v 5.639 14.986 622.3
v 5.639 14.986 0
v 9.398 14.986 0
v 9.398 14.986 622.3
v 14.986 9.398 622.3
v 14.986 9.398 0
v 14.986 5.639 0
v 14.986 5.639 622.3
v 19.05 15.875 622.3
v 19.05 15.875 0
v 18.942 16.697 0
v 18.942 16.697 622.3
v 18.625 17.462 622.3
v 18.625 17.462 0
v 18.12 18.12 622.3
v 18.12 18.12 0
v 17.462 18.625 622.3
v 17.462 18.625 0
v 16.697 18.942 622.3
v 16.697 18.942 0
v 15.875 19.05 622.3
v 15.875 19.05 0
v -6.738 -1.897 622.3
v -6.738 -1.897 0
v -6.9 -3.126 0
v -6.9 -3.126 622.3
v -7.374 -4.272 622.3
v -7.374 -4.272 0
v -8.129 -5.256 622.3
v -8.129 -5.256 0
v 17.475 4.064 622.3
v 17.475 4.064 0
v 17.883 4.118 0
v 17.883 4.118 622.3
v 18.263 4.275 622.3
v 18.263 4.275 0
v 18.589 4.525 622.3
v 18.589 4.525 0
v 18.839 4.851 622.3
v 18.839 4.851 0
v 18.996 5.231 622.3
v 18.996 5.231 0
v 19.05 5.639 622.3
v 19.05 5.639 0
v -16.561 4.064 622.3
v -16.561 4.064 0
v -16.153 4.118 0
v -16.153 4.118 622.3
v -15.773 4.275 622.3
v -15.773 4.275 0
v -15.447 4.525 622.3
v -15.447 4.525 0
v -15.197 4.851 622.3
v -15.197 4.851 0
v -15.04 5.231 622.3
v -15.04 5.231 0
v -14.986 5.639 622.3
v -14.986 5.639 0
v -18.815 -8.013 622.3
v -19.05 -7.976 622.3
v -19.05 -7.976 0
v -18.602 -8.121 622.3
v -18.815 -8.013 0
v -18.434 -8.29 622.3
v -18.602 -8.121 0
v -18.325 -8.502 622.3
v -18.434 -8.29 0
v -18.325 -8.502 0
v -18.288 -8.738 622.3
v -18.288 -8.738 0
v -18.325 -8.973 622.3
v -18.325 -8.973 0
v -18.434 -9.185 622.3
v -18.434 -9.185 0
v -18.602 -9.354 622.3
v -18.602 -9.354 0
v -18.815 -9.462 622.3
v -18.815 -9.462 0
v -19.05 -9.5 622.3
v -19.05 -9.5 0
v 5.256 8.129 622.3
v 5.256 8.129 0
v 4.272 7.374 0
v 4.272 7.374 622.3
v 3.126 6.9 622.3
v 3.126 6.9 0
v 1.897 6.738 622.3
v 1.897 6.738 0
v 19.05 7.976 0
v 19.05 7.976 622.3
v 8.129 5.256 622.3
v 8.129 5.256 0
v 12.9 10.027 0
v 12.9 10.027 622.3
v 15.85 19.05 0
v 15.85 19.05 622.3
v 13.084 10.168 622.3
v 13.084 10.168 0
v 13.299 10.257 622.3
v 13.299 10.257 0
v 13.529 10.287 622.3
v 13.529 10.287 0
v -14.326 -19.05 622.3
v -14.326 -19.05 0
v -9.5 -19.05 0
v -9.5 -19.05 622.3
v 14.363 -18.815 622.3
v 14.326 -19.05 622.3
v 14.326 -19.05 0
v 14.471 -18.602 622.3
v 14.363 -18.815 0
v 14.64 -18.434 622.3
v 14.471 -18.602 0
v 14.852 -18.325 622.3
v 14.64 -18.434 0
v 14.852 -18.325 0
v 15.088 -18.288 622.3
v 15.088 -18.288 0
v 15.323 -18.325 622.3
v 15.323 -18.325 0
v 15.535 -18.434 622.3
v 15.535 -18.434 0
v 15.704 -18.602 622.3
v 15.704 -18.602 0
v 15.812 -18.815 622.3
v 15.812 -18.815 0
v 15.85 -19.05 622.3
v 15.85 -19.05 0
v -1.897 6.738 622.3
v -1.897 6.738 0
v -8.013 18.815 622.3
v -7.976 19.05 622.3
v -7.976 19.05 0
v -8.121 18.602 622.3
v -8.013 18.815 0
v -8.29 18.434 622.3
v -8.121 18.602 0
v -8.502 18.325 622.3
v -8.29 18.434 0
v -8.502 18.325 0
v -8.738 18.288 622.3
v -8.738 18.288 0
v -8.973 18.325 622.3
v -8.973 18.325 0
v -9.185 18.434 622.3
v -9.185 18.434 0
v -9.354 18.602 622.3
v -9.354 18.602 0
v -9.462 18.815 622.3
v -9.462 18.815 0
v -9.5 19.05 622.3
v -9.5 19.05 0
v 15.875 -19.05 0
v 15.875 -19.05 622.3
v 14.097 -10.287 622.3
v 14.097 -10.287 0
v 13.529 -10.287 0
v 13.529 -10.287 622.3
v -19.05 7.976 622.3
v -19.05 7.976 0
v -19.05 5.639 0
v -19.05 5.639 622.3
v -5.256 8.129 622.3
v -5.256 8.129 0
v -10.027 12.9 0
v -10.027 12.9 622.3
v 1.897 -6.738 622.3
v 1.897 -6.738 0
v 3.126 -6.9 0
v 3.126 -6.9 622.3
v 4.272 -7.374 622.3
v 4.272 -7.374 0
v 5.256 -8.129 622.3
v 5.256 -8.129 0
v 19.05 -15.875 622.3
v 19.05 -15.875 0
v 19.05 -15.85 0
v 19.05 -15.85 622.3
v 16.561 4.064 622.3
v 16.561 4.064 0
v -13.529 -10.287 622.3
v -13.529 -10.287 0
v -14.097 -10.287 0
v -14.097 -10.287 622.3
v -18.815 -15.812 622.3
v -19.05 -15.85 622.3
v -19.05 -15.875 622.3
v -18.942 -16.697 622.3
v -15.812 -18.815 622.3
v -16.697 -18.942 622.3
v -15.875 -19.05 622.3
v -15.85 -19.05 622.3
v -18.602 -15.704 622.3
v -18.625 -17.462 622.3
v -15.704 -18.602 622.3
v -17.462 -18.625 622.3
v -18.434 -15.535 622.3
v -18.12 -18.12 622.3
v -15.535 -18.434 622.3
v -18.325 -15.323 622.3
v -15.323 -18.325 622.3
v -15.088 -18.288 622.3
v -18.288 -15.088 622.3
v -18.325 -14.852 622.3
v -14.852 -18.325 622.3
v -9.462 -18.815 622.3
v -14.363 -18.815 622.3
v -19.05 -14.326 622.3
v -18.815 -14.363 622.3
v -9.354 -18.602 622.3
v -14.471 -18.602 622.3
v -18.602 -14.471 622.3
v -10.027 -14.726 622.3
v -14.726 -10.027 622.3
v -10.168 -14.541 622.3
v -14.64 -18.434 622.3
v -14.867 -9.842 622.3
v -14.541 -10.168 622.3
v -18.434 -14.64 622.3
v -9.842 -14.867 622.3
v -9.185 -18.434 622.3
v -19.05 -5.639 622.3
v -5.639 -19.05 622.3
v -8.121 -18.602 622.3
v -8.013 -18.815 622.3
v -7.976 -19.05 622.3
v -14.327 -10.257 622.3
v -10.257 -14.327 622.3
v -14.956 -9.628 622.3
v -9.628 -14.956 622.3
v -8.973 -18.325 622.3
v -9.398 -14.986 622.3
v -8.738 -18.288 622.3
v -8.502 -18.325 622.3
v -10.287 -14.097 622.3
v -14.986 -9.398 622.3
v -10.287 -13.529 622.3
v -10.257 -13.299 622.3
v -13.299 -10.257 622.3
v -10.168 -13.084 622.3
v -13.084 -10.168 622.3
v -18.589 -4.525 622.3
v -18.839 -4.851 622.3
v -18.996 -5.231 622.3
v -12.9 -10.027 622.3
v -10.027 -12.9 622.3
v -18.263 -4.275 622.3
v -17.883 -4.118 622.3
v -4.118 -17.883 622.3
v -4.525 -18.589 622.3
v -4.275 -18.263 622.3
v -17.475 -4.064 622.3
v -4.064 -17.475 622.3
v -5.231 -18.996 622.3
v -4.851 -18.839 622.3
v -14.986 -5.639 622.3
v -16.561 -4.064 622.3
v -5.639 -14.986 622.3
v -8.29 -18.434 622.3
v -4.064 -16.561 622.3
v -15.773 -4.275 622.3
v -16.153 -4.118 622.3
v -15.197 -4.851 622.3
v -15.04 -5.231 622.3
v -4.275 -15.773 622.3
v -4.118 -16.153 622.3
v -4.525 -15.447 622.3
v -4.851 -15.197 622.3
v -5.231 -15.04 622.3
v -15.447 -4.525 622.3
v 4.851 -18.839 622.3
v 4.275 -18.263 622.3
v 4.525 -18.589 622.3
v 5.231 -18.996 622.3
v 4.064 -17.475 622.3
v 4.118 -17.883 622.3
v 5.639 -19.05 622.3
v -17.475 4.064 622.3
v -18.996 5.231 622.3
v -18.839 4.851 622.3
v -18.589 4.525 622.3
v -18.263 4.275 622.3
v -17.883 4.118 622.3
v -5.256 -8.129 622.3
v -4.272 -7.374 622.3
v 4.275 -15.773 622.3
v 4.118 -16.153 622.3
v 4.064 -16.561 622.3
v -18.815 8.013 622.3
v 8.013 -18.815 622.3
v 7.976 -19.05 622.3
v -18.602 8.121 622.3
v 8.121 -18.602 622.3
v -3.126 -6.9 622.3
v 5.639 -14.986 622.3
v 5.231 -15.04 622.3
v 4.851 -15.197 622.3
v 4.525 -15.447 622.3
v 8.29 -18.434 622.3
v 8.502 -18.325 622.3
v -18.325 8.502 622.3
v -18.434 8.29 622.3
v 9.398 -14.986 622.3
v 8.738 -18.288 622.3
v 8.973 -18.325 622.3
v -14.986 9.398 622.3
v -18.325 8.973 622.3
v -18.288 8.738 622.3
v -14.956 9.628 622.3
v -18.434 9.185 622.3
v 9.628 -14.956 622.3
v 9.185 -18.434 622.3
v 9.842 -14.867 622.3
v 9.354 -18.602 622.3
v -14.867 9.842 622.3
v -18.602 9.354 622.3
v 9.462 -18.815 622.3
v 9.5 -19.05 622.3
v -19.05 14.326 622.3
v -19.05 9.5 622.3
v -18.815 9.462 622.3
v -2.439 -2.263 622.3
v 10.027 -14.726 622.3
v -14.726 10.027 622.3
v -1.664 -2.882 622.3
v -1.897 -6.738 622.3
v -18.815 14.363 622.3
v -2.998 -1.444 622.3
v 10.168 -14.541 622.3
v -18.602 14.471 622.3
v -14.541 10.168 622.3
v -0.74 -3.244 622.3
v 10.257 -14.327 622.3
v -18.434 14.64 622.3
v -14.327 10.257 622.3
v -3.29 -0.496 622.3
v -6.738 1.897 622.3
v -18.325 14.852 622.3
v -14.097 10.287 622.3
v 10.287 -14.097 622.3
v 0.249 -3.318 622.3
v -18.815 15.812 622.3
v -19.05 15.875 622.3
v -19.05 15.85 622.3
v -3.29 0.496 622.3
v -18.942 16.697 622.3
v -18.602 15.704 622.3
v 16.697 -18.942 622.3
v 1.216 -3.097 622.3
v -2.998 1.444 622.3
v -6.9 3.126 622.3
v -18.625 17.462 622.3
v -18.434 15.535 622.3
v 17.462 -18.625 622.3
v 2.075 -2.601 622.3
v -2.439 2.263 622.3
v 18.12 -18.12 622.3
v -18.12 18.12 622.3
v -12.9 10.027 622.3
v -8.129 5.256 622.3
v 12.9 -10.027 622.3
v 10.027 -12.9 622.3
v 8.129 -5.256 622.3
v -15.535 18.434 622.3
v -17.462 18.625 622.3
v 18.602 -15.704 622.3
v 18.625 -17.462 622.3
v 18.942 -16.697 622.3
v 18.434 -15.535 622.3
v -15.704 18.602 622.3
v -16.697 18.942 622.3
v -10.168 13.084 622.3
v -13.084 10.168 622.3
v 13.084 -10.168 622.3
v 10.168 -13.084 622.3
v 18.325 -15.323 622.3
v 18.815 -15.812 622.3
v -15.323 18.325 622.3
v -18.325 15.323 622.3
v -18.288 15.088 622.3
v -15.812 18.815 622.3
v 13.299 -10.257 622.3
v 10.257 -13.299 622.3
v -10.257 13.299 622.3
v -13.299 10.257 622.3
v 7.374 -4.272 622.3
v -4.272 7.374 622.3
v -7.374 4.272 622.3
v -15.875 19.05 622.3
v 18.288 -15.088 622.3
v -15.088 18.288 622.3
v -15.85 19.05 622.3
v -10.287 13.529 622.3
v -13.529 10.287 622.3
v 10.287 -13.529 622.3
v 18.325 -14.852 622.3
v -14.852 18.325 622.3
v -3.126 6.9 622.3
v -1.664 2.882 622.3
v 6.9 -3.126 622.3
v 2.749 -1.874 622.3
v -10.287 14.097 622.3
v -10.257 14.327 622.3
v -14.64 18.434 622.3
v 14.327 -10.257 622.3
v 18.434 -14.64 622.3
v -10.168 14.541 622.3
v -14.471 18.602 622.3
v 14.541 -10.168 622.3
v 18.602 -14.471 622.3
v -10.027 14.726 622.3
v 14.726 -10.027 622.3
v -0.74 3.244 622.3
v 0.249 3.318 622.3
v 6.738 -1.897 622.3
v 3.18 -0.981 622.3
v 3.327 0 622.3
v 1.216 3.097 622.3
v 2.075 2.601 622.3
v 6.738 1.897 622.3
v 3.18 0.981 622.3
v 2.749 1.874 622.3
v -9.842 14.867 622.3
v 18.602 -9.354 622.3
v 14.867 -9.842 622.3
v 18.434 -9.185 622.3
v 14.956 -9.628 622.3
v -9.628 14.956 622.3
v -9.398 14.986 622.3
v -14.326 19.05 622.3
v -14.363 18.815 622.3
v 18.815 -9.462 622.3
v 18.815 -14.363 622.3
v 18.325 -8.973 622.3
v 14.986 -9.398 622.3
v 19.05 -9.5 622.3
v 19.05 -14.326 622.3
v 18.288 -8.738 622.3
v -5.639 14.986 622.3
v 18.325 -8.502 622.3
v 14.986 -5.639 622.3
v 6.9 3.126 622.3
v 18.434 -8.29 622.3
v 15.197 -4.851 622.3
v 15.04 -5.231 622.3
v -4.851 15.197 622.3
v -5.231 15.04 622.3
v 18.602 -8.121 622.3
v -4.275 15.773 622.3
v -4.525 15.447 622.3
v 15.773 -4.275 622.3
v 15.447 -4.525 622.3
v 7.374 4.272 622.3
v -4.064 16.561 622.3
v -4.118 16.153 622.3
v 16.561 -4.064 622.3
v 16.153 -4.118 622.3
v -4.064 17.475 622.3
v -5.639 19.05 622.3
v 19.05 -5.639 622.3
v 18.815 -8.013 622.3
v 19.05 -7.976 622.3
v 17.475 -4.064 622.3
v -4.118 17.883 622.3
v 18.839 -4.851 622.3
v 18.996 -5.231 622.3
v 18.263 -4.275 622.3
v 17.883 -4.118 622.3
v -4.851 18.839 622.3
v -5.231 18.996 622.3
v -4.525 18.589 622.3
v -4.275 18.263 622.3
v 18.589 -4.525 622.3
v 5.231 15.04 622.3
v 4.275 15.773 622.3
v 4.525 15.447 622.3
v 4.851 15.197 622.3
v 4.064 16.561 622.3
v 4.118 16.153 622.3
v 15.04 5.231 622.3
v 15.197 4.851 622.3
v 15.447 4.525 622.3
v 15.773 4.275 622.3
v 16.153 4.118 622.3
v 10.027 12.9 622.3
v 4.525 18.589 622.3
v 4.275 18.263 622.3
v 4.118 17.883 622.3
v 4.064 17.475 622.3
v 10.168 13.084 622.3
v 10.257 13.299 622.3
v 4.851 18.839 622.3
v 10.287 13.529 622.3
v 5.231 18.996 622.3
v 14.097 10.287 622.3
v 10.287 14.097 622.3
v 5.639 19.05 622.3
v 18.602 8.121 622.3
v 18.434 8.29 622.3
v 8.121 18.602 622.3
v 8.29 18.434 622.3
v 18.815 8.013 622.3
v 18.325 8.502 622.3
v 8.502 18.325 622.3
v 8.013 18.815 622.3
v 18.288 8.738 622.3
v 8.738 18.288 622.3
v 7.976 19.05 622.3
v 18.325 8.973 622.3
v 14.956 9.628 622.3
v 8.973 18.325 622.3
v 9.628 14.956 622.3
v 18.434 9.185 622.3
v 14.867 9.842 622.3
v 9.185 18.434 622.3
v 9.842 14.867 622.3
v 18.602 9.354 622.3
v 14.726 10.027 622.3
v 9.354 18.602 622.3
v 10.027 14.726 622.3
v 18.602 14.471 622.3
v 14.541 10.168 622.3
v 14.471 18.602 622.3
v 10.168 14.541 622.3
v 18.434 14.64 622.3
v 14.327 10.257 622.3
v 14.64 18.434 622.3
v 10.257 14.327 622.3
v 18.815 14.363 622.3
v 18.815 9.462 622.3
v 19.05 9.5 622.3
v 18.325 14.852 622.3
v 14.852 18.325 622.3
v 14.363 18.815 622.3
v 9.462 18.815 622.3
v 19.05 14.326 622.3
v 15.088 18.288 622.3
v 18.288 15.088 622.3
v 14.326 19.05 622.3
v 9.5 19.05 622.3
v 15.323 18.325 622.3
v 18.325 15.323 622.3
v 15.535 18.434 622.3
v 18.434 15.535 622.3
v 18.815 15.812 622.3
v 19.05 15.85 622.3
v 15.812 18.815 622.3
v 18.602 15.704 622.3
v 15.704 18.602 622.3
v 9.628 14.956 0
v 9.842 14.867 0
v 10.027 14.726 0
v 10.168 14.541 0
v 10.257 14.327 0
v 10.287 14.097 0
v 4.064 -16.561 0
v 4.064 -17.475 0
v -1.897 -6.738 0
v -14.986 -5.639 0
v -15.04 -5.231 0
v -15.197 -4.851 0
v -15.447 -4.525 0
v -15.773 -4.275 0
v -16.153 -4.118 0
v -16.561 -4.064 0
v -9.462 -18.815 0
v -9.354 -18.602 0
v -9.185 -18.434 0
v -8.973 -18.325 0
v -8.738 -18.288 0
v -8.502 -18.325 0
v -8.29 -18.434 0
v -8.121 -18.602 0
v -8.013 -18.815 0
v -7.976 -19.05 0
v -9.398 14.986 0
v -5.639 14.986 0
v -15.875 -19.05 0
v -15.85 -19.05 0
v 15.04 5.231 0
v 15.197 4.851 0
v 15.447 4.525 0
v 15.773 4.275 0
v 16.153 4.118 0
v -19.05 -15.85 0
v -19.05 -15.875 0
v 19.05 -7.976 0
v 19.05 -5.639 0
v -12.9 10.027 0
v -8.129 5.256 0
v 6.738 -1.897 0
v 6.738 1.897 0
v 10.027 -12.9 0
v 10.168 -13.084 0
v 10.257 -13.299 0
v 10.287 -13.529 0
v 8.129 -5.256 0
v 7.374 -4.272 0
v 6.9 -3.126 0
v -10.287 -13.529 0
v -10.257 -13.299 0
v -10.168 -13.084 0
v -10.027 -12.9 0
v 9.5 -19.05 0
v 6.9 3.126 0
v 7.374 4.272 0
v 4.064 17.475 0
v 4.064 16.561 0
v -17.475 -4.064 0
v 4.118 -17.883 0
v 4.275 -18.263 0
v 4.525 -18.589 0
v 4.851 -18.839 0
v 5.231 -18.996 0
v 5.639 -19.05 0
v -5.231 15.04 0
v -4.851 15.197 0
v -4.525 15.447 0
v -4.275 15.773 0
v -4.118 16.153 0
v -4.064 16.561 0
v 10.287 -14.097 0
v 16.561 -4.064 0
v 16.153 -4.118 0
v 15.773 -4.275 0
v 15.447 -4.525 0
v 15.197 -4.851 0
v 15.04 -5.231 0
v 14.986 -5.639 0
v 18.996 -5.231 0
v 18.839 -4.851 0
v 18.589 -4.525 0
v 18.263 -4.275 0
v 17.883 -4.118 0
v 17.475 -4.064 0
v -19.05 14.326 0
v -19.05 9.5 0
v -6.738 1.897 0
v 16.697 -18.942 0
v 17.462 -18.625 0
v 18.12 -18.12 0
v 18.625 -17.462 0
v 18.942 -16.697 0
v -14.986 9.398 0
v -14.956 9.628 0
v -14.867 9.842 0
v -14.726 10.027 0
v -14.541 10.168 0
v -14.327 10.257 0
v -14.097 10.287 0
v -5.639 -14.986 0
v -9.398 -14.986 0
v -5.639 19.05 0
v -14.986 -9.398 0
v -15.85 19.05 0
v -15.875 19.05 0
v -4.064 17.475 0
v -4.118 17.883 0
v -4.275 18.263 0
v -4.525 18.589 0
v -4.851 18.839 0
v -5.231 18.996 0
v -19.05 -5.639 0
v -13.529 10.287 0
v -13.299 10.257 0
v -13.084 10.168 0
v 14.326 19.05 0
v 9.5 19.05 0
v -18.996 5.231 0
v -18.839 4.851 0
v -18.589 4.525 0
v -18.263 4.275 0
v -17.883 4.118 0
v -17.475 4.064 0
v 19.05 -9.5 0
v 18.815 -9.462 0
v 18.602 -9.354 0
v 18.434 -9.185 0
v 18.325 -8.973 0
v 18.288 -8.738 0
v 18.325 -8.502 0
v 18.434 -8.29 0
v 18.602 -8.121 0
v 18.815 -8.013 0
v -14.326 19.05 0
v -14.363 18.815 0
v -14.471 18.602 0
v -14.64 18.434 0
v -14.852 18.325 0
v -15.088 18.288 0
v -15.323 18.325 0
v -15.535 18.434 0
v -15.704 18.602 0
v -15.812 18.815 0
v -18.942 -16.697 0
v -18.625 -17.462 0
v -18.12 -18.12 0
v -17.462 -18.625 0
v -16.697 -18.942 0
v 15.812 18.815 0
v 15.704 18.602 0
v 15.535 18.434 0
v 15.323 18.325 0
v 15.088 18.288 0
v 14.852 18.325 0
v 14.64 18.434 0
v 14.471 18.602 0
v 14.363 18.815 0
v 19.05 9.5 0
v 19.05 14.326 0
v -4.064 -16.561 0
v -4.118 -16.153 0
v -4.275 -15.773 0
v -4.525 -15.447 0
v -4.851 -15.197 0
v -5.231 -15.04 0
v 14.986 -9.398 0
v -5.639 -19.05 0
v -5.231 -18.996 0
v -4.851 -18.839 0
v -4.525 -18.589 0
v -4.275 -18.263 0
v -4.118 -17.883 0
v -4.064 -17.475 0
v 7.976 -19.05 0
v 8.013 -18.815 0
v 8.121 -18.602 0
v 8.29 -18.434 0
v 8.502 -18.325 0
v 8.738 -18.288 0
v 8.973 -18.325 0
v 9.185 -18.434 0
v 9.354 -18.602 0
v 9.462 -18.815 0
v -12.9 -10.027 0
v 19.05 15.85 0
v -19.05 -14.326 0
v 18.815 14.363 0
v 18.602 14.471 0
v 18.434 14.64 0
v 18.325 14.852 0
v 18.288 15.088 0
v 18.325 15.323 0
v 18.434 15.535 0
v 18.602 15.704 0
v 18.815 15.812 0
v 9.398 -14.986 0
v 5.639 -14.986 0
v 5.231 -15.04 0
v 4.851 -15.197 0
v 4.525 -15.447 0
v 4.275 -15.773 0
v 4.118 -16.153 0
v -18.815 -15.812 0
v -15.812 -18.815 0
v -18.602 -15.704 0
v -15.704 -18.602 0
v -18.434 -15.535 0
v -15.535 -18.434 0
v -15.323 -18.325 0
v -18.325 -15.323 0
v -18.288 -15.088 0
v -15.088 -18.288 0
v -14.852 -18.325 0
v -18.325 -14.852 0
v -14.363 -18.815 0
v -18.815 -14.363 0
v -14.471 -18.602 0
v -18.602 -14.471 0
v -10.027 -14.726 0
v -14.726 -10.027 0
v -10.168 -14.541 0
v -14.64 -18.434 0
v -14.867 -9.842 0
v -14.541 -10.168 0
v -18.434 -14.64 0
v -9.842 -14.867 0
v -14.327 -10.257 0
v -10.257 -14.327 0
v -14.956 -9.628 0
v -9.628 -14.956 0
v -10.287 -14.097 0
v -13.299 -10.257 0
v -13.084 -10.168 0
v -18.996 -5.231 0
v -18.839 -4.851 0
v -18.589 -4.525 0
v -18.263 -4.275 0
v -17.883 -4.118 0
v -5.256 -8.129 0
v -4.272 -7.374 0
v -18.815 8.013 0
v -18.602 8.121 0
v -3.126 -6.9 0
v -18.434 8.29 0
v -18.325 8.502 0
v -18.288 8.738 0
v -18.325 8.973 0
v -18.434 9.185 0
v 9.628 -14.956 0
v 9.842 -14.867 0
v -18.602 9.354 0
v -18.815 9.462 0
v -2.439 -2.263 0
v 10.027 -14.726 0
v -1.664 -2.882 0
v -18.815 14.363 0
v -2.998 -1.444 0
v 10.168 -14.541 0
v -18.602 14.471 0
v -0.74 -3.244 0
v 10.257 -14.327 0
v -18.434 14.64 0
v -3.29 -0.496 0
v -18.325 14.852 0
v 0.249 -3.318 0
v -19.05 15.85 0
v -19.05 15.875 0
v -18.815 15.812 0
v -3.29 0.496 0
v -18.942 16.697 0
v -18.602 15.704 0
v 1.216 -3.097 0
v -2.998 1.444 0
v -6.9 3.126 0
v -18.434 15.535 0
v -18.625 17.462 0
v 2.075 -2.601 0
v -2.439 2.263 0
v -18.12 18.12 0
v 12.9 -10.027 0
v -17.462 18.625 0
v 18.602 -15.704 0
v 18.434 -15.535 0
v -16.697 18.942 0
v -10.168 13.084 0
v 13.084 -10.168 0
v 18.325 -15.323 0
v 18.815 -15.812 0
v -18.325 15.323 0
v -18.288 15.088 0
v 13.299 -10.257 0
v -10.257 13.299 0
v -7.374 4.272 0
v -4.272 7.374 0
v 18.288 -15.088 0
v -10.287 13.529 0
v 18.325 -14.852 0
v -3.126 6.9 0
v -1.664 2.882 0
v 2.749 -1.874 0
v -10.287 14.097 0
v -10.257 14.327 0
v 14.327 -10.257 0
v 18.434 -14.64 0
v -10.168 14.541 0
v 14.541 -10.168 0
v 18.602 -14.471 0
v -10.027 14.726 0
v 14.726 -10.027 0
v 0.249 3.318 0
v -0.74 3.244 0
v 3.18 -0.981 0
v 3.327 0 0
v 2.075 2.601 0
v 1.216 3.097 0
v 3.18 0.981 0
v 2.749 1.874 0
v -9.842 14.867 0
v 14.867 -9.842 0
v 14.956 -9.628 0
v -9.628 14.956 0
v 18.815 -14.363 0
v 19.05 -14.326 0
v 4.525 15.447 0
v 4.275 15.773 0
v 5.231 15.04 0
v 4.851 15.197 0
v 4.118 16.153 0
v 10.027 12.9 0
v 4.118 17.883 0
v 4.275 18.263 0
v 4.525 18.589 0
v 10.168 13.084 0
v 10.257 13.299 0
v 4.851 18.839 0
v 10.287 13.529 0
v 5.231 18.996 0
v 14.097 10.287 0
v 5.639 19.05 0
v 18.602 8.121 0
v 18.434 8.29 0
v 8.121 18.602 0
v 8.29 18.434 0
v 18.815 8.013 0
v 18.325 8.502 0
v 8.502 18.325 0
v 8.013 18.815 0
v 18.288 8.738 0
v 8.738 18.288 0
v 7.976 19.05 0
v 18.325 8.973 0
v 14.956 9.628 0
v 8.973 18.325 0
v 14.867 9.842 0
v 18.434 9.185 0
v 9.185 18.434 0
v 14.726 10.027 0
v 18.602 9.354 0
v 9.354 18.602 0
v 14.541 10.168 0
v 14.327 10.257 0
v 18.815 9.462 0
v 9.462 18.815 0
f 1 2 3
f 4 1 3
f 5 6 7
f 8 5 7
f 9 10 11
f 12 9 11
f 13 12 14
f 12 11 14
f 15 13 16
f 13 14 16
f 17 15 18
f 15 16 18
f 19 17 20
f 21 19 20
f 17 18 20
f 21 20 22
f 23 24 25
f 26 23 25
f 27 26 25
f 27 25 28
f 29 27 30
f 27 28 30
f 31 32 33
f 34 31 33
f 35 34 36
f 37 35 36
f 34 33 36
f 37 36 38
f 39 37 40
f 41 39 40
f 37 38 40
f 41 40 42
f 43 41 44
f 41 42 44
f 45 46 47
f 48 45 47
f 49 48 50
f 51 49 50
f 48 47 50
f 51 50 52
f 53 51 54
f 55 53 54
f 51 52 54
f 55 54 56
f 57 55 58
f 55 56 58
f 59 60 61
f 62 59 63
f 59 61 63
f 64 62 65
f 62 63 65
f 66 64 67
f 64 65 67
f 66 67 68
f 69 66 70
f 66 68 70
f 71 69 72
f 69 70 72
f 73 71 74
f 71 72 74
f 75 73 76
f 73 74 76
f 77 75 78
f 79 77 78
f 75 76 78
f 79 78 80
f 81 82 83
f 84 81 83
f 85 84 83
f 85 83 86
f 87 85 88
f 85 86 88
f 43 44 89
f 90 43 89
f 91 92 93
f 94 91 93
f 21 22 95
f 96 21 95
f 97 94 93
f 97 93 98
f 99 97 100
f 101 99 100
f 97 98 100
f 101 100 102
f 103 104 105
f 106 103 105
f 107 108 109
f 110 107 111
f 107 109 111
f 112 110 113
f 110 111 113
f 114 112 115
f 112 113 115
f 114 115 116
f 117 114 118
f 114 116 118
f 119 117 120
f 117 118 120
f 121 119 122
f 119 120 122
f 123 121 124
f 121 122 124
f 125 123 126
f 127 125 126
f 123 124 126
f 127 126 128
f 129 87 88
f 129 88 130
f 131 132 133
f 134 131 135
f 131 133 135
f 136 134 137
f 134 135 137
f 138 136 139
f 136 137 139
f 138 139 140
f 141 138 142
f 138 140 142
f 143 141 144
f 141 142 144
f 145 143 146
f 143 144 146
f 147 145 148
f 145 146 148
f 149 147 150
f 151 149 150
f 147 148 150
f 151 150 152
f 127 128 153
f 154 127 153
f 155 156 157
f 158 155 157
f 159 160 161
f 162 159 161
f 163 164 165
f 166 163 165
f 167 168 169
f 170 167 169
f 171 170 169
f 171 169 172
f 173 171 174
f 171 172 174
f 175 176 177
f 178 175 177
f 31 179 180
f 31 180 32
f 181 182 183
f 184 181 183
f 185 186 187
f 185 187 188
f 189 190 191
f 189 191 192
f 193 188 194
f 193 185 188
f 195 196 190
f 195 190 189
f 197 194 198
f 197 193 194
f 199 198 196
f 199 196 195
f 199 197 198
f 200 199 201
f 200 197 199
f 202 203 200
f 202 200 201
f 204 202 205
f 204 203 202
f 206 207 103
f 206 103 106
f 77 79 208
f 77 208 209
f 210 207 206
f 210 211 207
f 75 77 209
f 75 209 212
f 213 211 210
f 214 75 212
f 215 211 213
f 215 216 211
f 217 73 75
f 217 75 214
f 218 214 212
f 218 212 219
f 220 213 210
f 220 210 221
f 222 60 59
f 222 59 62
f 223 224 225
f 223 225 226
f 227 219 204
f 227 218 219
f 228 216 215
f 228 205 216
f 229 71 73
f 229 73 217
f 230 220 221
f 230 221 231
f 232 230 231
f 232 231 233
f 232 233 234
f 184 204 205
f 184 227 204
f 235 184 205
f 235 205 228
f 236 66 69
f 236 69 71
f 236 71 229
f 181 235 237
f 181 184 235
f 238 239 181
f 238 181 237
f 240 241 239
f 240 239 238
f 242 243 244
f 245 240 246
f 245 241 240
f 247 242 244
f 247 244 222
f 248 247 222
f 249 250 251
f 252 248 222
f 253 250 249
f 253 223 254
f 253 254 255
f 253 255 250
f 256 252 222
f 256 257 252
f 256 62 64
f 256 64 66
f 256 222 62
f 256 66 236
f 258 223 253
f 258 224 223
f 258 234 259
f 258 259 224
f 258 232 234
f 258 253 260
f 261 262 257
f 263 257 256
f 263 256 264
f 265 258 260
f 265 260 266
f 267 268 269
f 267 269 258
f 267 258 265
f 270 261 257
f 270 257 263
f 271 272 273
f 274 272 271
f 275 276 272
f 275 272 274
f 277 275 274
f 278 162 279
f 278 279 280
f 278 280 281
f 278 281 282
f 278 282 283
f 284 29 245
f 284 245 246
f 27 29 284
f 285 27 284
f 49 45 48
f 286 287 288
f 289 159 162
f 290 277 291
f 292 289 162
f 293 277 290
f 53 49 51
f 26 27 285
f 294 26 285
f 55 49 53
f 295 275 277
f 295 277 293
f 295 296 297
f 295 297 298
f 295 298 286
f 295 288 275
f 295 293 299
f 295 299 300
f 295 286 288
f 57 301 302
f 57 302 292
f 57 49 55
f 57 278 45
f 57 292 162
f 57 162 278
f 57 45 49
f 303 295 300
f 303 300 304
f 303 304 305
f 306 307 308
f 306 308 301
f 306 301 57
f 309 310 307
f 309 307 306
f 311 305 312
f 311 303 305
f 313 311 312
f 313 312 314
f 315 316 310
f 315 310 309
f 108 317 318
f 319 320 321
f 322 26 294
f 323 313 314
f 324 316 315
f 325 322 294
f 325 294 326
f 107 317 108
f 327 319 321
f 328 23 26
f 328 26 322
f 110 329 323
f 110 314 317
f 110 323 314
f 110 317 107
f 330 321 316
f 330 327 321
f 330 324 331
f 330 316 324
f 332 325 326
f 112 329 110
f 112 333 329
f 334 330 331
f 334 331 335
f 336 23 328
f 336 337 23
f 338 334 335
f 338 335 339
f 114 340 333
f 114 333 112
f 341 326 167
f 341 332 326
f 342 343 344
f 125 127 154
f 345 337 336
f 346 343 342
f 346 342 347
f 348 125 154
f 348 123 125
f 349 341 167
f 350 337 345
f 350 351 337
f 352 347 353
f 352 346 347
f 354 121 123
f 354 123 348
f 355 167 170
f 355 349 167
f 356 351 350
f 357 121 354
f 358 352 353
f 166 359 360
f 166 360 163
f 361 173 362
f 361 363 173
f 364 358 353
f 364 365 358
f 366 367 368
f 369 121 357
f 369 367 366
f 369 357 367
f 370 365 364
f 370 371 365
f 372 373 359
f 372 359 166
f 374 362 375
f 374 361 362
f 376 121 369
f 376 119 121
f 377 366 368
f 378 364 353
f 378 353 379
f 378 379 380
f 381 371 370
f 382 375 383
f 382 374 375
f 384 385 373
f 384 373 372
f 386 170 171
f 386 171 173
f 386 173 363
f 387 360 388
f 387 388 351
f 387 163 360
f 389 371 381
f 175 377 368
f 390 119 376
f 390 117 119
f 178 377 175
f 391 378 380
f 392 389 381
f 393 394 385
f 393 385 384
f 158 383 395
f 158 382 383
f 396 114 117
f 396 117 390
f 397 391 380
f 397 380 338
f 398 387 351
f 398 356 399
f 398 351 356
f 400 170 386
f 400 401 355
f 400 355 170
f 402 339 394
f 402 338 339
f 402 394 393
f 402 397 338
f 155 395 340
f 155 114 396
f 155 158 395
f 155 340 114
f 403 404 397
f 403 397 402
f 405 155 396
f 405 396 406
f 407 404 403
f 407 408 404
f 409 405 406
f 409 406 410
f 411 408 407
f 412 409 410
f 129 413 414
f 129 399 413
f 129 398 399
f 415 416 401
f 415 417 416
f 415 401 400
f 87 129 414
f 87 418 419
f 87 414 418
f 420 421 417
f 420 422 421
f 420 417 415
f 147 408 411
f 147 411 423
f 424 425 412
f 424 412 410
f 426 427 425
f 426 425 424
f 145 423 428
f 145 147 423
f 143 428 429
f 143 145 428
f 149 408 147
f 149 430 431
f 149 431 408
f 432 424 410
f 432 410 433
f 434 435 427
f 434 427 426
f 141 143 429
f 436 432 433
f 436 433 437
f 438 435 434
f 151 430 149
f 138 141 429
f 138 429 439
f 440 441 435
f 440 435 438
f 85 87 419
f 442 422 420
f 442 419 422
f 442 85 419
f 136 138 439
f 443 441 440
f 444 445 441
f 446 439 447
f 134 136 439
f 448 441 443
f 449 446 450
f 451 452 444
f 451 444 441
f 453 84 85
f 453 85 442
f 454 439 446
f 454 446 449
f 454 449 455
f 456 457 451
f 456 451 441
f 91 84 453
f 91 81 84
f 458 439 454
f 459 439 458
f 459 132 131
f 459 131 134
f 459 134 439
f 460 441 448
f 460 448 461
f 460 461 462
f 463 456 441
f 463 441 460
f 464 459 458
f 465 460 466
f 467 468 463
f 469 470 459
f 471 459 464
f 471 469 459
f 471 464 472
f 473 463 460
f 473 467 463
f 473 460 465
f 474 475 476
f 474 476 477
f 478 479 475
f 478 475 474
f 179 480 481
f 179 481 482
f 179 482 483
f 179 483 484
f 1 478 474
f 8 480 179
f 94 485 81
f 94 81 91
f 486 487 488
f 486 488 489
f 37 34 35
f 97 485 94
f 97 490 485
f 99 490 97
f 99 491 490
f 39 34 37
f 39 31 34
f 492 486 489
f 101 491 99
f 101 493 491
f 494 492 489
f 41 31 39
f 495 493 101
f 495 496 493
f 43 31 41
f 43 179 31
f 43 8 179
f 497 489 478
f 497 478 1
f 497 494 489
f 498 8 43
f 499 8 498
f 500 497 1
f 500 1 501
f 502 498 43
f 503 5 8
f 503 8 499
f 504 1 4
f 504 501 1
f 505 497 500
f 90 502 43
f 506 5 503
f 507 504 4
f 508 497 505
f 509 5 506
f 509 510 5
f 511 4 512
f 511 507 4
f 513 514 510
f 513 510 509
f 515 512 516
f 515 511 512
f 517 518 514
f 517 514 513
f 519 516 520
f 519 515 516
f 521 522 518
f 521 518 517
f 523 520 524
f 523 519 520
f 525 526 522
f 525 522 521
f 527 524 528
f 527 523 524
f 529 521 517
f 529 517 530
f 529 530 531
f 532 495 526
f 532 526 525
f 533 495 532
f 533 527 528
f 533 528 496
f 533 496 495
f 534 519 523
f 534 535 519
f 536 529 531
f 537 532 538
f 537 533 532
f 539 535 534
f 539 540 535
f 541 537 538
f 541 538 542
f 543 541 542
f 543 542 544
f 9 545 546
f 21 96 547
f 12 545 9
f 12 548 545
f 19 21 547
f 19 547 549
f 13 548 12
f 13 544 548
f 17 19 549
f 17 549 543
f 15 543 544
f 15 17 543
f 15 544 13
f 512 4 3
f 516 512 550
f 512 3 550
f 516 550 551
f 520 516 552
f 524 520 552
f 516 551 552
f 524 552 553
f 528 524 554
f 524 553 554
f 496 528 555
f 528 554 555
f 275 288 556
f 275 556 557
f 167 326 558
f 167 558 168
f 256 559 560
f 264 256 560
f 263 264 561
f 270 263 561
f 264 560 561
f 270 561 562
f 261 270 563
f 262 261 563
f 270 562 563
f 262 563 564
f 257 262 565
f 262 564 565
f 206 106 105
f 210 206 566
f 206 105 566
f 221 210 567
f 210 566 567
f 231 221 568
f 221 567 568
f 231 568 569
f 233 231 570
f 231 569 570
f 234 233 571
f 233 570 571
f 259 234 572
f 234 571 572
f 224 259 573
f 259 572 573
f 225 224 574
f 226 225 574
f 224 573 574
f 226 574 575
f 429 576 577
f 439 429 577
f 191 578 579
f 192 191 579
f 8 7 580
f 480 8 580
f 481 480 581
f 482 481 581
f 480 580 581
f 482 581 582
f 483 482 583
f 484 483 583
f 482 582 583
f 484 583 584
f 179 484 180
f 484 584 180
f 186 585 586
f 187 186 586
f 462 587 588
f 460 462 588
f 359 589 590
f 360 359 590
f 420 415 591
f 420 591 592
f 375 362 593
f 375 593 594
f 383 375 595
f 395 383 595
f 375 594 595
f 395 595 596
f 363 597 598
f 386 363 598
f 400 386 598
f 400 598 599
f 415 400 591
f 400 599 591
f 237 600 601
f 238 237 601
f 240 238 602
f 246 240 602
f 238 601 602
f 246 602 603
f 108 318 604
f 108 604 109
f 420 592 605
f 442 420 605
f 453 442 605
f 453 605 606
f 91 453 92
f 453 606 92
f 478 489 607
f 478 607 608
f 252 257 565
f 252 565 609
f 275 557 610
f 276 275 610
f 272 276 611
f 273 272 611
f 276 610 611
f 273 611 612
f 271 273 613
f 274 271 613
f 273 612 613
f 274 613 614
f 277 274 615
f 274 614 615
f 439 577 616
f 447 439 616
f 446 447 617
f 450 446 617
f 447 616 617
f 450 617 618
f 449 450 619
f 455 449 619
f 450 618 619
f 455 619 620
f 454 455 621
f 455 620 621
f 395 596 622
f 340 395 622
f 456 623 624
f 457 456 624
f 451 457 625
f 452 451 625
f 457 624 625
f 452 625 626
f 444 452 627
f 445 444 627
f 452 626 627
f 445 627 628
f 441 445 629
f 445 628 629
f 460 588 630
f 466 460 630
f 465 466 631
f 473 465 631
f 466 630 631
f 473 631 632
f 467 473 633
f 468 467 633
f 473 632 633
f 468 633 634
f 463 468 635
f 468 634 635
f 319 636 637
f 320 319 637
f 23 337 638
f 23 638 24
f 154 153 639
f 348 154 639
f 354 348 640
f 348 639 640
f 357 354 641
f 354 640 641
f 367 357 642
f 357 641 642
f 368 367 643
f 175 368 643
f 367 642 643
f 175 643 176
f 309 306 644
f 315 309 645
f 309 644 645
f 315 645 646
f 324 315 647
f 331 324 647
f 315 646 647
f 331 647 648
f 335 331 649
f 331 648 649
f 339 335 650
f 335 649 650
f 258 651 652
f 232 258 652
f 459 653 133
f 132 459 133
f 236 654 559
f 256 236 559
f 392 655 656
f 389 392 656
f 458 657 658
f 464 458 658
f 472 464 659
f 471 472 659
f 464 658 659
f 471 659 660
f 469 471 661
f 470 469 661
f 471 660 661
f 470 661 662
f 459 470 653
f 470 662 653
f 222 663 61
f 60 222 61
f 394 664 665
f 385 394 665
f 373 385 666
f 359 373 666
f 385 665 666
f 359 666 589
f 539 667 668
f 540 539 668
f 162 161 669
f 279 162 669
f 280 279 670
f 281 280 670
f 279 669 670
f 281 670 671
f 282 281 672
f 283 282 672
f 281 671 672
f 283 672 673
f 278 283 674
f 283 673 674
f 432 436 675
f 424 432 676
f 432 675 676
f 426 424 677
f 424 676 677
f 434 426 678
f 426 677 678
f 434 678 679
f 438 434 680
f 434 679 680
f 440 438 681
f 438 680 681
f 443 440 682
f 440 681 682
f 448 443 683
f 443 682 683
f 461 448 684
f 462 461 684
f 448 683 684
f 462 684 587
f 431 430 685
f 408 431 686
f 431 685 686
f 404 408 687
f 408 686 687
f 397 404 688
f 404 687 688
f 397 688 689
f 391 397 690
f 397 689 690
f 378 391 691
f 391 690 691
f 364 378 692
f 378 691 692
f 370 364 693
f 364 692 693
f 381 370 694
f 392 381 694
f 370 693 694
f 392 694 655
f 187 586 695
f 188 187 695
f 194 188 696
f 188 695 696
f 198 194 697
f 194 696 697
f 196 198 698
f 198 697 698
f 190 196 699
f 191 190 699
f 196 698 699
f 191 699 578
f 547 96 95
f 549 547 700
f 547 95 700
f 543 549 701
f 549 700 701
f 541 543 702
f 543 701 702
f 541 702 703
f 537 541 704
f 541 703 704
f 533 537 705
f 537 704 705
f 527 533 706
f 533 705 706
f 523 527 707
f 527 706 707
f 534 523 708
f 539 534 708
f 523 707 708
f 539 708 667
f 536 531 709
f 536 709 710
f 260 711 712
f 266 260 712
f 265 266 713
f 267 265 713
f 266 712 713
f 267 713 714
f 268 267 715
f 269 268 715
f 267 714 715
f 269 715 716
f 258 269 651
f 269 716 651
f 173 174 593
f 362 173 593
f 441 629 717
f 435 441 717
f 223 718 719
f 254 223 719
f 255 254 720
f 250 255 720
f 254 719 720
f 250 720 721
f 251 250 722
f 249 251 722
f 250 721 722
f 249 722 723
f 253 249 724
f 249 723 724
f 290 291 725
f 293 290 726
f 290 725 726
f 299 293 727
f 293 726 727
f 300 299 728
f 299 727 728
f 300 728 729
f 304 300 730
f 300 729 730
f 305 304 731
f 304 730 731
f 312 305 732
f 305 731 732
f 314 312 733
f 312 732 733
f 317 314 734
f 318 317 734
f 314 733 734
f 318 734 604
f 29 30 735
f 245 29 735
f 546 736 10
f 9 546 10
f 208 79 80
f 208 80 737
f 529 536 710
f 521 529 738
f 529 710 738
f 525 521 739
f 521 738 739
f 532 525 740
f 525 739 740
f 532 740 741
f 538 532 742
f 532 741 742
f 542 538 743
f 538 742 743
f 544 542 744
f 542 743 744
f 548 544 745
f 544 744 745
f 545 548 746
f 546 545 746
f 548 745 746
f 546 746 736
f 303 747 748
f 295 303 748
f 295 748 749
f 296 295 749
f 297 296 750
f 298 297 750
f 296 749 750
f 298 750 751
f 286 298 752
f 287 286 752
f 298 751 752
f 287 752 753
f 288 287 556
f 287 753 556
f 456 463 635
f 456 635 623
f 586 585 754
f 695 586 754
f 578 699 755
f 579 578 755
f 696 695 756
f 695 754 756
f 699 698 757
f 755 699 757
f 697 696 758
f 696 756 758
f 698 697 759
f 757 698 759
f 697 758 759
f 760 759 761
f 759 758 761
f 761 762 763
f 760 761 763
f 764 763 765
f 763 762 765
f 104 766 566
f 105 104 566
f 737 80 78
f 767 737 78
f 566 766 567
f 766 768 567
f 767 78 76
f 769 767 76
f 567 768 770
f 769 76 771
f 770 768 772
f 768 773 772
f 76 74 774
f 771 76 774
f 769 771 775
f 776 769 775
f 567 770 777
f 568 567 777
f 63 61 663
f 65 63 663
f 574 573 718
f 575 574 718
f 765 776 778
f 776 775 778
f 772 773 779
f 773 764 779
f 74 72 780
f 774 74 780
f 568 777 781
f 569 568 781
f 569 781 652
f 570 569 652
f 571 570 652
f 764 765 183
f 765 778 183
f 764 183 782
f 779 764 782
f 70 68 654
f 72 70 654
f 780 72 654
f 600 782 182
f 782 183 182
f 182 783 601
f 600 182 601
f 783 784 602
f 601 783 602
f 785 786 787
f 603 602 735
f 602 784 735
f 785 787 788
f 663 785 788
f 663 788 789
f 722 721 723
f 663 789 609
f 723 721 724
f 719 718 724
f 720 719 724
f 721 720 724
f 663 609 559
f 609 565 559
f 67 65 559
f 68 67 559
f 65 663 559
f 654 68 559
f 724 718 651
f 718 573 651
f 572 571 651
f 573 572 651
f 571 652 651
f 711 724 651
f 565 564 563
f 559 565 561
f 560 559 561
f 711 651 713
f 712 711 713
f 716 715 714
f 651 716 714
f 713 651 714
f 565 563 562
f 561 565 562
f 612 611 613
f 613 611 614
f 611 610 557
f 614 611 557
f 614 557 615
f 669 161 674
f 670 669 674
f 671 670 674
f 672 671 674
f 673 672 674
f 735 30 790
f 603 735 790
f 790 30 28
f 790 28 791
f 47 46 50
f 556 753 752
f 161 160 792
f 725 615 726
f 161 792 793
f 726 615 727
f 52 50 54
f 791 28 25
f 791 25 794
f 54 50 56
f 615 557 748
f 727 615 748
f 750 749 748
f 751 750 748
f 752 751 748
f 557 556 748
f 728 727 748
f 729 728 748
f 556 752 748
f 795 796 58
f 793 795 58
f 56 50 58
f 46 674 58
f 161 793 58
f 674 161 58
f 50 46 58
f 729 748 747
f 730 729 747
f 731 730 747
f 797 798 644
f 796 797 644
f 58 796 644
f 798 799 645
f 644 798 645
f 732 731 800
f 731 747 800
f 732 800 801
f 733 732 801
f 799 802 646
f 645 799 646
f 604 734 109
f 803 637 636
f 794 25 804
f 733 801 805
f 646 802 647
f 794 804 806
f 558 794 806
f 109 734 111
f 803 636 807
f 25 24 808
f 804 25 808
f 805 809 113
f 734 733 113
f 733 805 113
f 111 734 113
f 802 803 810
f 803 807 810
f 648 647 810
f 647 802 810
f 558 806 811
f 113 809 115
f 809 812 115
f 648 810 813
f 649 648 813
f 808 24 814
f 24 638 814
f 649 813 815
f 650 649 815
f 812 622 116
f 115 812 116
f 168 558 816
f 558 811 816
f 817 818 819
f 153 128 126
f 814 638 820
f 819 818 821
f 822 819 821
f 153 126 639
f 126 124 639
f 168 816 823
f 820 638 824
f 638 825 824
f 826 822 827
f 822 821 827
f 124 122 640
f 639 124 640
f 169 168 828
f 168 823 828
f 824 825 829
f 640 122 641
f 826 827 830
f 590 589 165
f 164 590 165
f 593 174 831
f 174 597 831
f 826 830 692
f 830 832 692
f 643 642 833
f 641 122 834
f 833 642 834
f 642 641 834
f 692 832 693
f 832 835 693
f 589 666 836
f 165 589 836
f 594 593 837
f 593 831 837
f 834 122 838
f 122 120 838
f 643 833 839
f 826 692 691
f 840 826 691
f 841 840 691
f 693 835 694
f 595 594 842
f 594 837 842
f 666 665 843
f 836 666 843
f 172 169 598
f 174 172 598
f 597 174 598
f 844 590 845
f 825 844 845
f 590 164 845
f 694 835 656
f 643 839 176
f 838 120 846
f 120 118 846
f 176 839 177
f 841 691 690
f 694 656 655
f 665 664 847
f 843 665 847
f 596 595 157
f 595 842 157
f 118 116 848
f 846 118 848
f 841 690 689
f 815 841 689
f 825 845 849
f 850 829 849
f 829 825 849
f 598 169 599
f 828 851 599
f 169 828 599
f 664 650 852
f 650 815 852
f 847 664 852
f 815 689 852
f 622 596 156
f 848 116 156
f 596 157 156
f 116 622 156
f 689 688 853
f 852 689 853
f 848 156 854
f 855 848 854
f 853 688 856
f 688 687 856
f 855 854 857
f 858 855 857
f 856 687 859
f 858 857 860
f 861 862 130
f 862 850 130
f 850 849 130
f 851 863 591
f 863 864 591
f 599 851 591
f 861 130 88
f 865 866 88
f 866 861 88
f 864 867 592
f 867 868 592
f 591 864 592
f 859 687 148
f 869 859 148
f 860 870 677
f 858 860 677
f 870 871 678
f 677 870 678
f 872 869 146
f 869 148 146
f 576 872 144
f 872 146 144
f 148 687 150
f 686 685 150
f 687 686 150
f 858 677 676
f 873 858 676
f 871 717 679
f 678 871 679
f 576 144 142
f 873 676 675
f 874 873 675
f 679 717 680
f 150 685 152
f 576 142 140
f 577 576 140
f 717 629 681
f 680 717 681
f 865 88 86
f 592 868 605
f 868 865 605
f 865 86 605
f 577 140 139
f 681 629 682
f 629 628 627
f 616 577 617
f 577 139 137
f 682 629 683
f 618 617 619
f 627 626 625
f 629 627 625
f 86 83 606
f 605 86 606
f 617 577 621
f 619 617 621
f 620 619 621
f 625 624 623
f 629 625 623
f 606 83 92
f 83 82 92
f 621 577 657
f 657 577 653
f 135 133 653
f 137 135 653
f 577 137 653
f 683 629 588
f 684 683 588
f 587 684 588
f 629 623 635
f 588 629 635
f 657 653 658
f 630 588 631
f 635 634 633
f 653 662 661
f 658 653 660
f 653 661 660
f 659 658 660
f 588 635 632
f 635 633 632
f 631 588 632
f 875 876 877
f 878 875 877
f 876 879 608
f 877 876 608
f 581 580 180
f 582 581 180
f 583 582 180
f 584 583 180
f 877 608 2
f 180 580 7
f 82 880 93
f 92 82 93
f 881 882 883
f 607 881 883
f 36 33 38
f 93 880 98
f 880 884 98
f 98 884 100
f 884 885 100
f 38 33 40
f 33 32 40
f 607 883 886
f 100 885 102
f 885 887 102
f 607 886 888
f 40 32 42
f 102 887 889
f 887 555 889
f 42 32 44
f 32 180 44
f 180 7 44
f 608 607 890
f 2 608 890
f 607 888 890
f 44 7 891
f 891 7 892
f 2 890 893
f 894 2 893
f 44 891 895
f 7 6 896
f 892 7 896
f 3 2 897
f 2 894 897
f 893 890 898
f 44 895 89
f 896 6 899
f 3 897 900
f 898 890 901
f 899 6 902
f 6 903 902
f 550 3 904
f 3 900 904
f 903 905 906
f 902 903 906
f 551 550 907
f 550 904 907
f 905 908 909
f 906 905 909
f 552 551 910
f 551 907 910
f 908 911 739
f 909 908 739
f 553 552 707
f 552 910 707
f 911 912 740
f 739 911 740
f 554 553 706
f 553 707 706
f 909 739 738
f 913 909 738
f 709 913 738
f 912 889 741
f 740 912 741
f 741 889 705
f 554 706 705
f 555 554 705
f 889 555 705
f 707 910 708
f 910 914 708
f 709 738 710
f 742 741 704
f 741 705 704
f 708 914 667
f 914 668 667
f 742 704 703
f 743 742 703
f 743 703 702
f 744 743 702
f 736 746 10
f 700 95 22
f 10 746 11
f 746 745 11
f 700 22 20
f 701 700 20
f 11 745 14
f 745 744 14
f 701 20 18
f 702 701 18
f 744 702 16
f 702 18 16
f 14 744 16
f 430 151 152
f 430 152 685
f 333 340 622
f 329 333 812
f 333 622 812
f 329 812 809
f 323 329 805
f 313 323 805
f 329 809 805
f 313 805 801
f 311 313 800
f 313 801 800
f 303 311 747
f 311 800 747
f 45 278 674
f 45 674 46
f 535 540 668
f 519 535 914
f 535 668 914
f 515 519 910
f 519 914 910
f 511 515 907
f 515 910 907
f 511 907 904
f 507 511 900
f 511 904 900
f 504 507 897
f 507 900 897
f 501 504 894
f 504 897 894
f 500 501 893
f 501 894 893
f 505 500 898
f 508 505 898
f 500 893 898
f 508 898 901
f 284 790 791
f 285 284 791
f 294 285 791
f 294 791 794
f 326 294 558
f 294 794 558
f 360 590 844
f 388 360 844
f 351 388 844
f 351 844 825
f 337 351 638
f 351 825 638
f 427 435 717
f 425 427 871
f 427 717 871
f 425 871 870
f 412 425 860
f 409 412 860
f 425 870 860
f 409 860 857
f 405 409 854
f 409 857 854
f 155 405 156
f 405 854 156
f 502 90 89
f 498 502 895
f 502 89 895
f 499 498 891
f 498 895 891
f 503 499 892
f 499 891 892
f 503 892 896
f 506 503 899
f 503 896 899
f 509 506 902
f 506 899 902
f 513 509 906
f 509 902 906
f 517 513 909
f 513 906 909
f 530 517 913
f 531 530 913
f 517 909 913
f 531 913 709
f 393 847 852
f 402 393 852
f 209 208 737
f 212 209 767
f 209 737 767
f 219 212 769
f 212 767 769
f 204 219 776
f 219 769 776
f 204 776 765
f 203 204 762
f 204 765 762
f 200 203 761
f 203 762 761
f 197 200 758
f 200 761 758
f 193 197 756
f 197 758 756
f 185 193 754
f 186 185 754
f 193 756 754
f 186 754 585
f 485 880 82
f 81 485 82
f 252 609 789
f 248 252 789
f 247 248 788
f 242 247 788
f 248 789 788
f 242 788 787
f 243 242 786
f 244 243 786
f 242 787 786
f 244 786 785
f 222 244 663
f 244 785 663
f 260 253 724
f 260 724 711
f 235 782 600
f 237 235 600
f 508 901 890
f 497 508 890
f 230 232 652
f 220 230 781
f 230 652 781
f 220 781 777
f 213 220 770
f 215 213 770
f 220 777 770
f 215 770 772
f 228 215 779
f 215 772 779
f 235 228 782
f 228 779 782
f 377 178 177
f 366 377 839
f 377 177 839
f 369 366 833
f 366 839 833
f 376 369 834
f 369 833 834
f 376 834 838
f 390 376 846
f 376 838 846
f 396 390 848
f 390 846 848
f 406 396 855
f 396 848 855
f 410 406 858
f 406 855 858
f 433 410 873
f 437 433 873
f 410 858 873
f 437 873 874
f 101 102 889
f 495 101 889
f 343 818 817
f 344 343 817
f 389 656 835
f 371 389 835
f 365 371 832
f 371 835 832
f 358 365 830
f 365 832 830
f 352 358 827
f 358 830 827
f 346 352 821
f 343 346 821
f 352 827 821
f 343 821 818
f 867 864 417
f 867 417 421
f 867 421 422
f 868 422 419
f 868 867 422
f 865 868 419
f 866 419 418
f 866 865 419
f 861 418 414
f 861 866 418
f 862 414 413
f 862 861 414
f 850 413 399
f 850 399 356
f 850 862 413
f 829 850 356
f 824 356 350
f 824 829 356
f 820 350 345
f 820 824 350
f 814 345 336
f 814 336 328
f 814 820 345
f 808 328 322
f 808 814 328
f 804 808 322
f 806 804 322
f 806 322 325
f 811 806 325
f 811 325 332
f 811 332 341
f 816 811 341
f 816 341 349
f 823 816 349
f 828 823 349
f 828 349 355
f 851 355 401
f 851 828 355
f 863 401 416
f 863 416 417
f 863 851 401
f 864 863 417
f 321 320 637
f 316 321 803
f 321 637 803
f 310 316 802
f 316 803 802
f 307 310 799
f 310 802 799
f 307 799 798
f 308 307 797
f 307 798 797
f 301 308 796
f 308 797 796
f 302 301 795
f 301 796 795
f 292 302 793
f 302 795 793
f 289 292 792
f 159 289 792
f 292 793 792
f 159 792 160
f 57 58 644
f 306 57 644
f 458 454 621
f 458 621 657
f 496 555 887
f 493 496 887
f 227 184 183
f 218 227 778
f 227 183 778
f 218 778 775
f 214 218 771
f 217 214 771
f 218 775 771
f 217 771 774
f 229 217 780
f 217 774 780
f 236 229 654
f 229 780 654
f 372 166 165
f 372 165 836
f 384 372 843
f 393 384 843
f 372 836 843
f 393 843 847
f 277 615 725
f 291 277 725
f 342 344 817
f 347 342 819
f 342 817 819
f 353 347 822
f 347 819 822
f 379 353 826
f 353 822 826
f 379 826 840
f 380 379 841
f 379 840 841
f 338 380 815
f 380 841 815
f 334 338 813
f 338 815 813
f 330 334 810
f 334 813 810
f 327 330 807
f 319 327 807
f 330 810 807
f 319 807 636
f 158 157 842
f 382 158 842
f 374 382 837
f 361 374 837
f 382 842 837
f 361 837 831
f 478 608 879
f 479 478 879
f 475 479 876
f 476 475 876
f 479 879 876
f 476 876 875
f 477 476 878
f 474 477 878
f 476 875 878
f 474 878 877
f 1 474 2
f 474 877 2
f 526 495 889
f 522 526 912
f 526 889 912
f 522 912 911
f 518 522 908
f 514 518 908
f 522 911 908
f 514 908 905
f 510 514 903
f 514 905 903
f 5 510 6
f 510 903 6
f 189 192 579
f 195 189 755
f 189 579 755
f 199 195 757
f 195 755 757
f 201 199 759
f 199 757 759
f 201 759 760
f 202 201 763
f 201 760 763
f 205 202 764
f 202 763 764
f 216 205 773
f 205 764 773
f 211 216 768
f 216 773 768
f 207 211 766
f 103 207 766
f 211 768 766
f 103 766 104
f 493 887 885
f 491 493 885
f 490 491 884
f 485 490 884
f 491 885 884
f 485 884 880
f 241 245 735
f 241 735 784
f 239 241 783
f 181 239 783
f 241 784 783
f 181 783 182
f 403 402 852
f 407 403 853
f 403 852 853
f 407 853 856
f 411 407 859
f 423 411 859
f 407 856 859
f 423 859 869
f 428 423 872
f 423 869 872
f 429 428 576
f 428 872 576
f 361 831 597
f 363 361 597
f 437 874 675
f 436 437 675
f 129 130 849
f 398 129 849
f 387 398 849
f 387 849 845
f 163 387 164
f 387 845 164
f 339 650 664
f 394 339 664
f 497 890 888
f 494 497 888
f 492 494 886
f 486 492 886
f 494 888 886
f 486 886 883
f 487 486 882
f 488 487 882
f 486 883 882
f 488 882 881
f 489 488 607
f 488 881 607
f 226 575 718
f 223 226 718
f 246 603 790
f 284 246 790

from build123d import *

# Parameters (mm, degrees)
SKETCH1_R           = 3.3274
BOSS_EXTRUDE1_DEPTH = 622.3


with BuildPart() as part:
    # Sketch1 → Boss-Extrude1 (new body)
    with BuildSketch(Plane.XY):
        with BuildLine():
            Line((-14.097, 10.287), (-13.528918, 10.287))
            ThreePointArc((-13.528918, 10.287), (-13.188712428, 10.219328904), (-12.900300071, 10.026617928))
            Line((-12.900300071, 10.026617928), (-8.129198975, 5.255516832))
            ThreePointArc((-8.129198975, 5.255516832), (-7.09957176, 3.71457081), (-6.738014764, 1.896901043))
            Line((-6.738014764, 1.896901043), (-6.738014764, -1.896901043))
            ThreePointArc((-6.738014764, -1.896901043), (-7.09957176, -3.71457081), (-8.129198975, -5.255516832))
            Line((-8.129198975, -5.255516832), (-12.900300071, -10.026617928))
            ThreePointArc((-12.900300071, -10.026617928), (-13.188712428, -10.219328904), (-13.528918, -10.287))
            Line((-13.528918, -10.287), (-14.097, -10.287))
            ThreePointArc((-14.097, -10.287), (-14.725617928, -10.026617928), (-14.986, -9.398))
            Line((-14.986, -9.398), (-14.986, -5.6388))
            ThreePointArc((-14.986, -5.6388), (-15.447248241, -4.525248241), (-16.5608, -4.064))
            Line((-16.5608, -4.064), (-17.4752, -4.064))
            ThreePointArc((-17.4752, -4.064), (-18.588751759, -4.525248241), (-19.05, -5.6388))
            Line((-19.05, -5.6388), (-19.05, -7.9756))
            ThreePointArc((-19.05, -7.9756), (-18.288, -8.7376), (-19.05, -9.4996))
            Line((-19.05, -9.4996), (-19.05, -14.3256))
            ThreePointArc((-19.05, -14.3256), (-18.288, -15.0876), (-19.05, -15.8496))
            Line((-19.05, -15.8496), (-19.05, -15.875))
            ThreePointArc((-19.05, -15.875), (-18.12006403, -18.12006403), (-15.875, -19.05))
            Line((-15.875, -19.05), (-15.8496, -19.05))
            ThreePointArc((-15.8496, -19.05), (-15.0876, -18.288), (-14.3256, -19.05))
            Line((-14.3256, -19.05), (-9.4996, -19.05))
            ThreePointArc((-9.4996, -19.05), (-8.7376, -18.288), (-7.9756, -19.05))
            Line((-7.9756, -19.05), (-5.6388, -19.05))
            ThreePointArc((-5.6388, -19.05), (-4.525248241, -18.588751759), (-4.064, -17.4752))
            Line((-4.064, -17.4752), (-4.064, -16.5608))
            ThreePointArc((-4.064, -16.5608), (-4.525248241, -15.447248241), (-5.6388, -14.986))
            Line((-5.6388, -14.986), (-9.398, -14.986))
            ThreePointArc((-9.398, -14.986), (-10.026617928, -14.725617928), (-10.287, -14.097))
            Line((-10.287, -14.097), (-10.287, -13.528918))
            ThreePointArc((-10.287, -13.528918), (-10.219328904, -13.188712428), (-10.026617928, -12.900300071))
            Line((-10.026617928, -12.900300071), (-5.255516832, -8.129198975))
            ThreePointArc((-5.255516832, -8.129198975), (-3.71457081, -7.09957176), (-1.896901043, -6.738014764))
            Line((-1.896901043, -6.738014764), (1.896901043, -6.738014764))
            ThreePointArc((1.896901043, -6.738014764), (3.71457081, -7.09957176), (5.255516832, -8.129198975))
            Line((5.255516832, -8.129198975), (10.026617928, -12.900300071))
            ThreePointArc((10.026617928, -12.900300071), (10.219328904, -13.188712428), (10.287, -13.528918))
            Line((10.287, -13.528918), (10.287, -14.097))
            ThreePointArc((10.287, -14.097), (10.026617928, -14.725617928), (9.398, -14.986))
            Line((9.398, -14.986), (5.6388, -14.986))
            ThreePointArc((5.6388, -14.986), (4.525248241, -15.447248241), (4.064, -16.5608))
            Line((4.064, -16.5608), (4.064, -17.4752))
            ThreePointArc((4.064, -17.4752), (4.525248241, -18.588751759), (5.6388, -19.05))
            Line((5.6388, -19.05), (7.9756, -19.05))
            ThreePointArc((7.9756, -19.05), (8.7376, -18.288), (9.4996, -19.05))
            Line((9.4996, -19.05), (14.3256, -19.05))
            ThreePointArc((14.3256, -19.05), (15.0876, -18.288), (15.8496, -19.05))
            Line((15.8496, -19.05), (15.875, -19.05))
            ThreePointArc((15.875, -19.05), (18.12006403, -18.12006403), (19.05, -15.875))
            Line((19.05, -15.875), (19.05, -15.8496))
            ThreePointArc((19.05, -15.8496), (18.288, -15.0876), (19.05, -14.3256))
            Line((19.05, -14.3256), (19.05, -9.4996))
            ThreePointArc((19.05, -9.4996), (18.288, -8.7376), (19.05, -7.9756))
            Line((19.05, -7.9756), (19.05, -5.6388))
            ThreePointArc((19.05, -5.6388), (18.588751759, -4.525248241), (17.4752, -4.064))
            Line((17.4752, -4.064), (16.5608, -4.064))
            ThreePointArc((16.5608, -4.064), (15.447248241, -4.525248241), (14.986, -5.6388))
            Line((14.986, -5.6388), (14.986, -9.398))
            ThreePointArc((14.986, -9.398), (14.725617928, -10.026617928), (14.097, -10.287))
            Line((14.097, -10.287), (13.528918, -10.287))
            ThreePointArc((13.528918, -10.287), (13.188712428, -10.219328904), (12.900300071, -10.026617928))
            Line((12.900300071, -10.026617928), (8.129198975, -5.255516832))
            ThreePointArc((8.129198975, -5.255516832), (7.09957176, -3.71457081), (6.738014764, -1.896901043))
            Line((6.738014764, -1.896901043), (6.738014764, 1.896901043))
            ThreePointArc((6.738014764, 1.896901043), (7.09957176, 3.71457081), (8.129198975, 5.255516832))
            Line((8.129198975, 5.255516832), (12.900300071, 10.026617928))
            ThreePointArc((12.900300071, 10.026617928), (13.188712428, 10.219328904), (13.528918, 10.287))
            Line((13.528918, 10.287), (14.097, 10.287))
            ThreePointArc((14.097, 10.287), (14.725617928, 10.026617928), (14.986, 9.398))
            Line((14.986, 9.398), (14.986, 5.6388))
            ThreePointArc((14.986, 5.6388), (15.447248241, 4.525248241), (16.5608, 4.064))
            Line((16.5608, 4.064), (17.4752, 4.064))
            ThreePointArc((17.4752, 4.064), (18.588751759, 4.525248241), (19.05, 5.6388))
            Line((19.05, 5.6388), (19.05, 7.9756))
            ThreePointArc((19.05, 7.9756), (18.288, 8.7376), (19.05, 9.4996))
            Line((19.05, 9.4996), (19.05, 14.3256))
            ThreePointArc((19.05, 14.3256), (18.288, 15.0876), (19.05, 15.8496))
            Line((19.05, 15.8496), (19.05, 15.875))
            ThreePointArc((19.05, 15.875), (18.12006403, 18.12006403), (15.875, 19.05))
            Line((15.875, 19.05), (15.8496, 19.05))
            ThreePointArc((15.8496, 19.05), (15.0876, 18.288), (14.3256, 19.05))
            Line((14.3256, 19.05), (9.4996, 19.05))
            ThreePointArc((9.4996, 19.05), (8.7376, 18.288), (7.9756, 19.05))
            Line((7.9756, 19.05), (5.6388, 19.05))
            ThreePointArc((5.6388, 19.05), (4.525248241, 18.588751759), (4.064, 17.4752))
            Line((4.064, 17.4752), (4.064, 16.5608))
            ThreePointArc((4.064, 16.5608), (4.525248241, 15.447248241), (5.6388, 14.986))
            Line((5.6388, 14.986), (9.398, 14.986))
            ThreePointArc((9.398, 14.986), (10.026617928, 14.725617928), (10.287, 14.097))
            Line((10.287, 14.097), (10.287, 13.528918))
            ThreePointArc((10.287, 13.528918), (10.219328904, 13.188712428), (10.026617928, 12.900300071))
            Line((10.026617928, 12.900300071), (5.255516832, 8.129198975))
            ThreePointArc((5.255516832, 8.129198975), (3.71457081, 7.09957176), (1.896901043, 6.738014764))
            Line((1.896901043, 6.738014764), (-1.896901043, 6.738014764))
            ThreePointArc((-1.896901043, 6.738014764), (-3.71457081, 7.09957176), (-5.255516832, 8.129198975))
            Line((-5.255516832, 8.129198975), (-10.026617928, 12.900300071))
            ThreePointArc((-10.026617928, 12.900300071), (-10.219328904, 13.188712428), (-10.287, 13.528918))
            Line((-10.287, 13.528918), (-10.287, 14.097))
            ThreePointArc((-10.287, 14.097), (-10.026617928, 14.725617928), (-9.398, 14.986))
            Line((-9.398, 14.986), (-5.6388, 14.986))
            ThreePointArc((-5.6388, 14.986), (-4.525248241, 15.447248241), (-4.064, 16.5608))
            Line((-4.064, 16.5608), (-4.064, 17.4752))
            ThreePointArc((-4.064, 17.4752), (-4.525248241, 18.588751759), (-5.6388, 19.05))
            Line((-5.6388, 19.05), (-7.9756, 19.05))
            ThreePointArc((-7.9756, 19.05), (-8.7376, 18.288), (-9.4996, 19.05))
            Line((-9.4996, 19.05), (-14.3256, 19.05))
            ThreePointArc((-14.3256, 19.05), (-15.0876, 18.288), (-15.8496, 19.05))
            Line((-15.8496, 19.05), (-15.875, 19.05))
            ThreePointArc((-15.875, 19.05), (-18.12006403, 18.12006403), (-19.05, 15.875))
            Line((-19.05, 15.875), (-19.05, 15.8496))
            ThreePointArc((-19.05, 15.8496), (-18.288, 15.0876), (-19.05, 14.3256))
            Line((-19.05, 14.3256), (-19.05, 9.4996))
            ThreePointArc((-19.05, 9.4996), (-18.288, 8.7376), (-19.05, 7.9756))
            Line((-19.05, 7.9756), (-19.05, 5.6388))
            ThreePointArc((-19.05, 5.6388), (-18.588751759, 4.525248241), (-17.4752, 4.064))
            Line((-17.4752, 4.064), (-16.5608, 4.064))
            ThreePointArc((-16.5608, 4.064), (-15.447248241, 4.525248241), (-14.986, 5.6388))
            Line((-14.986, 5.6388), (-14.986, 9.398))
            ThreePointArc((-14.986, 9.398), (-14.725617928, 10.026617928), (-14.097, 10.287))
        make_face()
        Circle(SKETCH1_R, mode=Mode.SUBTRACT)
    extrude(amount=BOSS_EXTRUDE1_DEPTH)


solid = part.part
